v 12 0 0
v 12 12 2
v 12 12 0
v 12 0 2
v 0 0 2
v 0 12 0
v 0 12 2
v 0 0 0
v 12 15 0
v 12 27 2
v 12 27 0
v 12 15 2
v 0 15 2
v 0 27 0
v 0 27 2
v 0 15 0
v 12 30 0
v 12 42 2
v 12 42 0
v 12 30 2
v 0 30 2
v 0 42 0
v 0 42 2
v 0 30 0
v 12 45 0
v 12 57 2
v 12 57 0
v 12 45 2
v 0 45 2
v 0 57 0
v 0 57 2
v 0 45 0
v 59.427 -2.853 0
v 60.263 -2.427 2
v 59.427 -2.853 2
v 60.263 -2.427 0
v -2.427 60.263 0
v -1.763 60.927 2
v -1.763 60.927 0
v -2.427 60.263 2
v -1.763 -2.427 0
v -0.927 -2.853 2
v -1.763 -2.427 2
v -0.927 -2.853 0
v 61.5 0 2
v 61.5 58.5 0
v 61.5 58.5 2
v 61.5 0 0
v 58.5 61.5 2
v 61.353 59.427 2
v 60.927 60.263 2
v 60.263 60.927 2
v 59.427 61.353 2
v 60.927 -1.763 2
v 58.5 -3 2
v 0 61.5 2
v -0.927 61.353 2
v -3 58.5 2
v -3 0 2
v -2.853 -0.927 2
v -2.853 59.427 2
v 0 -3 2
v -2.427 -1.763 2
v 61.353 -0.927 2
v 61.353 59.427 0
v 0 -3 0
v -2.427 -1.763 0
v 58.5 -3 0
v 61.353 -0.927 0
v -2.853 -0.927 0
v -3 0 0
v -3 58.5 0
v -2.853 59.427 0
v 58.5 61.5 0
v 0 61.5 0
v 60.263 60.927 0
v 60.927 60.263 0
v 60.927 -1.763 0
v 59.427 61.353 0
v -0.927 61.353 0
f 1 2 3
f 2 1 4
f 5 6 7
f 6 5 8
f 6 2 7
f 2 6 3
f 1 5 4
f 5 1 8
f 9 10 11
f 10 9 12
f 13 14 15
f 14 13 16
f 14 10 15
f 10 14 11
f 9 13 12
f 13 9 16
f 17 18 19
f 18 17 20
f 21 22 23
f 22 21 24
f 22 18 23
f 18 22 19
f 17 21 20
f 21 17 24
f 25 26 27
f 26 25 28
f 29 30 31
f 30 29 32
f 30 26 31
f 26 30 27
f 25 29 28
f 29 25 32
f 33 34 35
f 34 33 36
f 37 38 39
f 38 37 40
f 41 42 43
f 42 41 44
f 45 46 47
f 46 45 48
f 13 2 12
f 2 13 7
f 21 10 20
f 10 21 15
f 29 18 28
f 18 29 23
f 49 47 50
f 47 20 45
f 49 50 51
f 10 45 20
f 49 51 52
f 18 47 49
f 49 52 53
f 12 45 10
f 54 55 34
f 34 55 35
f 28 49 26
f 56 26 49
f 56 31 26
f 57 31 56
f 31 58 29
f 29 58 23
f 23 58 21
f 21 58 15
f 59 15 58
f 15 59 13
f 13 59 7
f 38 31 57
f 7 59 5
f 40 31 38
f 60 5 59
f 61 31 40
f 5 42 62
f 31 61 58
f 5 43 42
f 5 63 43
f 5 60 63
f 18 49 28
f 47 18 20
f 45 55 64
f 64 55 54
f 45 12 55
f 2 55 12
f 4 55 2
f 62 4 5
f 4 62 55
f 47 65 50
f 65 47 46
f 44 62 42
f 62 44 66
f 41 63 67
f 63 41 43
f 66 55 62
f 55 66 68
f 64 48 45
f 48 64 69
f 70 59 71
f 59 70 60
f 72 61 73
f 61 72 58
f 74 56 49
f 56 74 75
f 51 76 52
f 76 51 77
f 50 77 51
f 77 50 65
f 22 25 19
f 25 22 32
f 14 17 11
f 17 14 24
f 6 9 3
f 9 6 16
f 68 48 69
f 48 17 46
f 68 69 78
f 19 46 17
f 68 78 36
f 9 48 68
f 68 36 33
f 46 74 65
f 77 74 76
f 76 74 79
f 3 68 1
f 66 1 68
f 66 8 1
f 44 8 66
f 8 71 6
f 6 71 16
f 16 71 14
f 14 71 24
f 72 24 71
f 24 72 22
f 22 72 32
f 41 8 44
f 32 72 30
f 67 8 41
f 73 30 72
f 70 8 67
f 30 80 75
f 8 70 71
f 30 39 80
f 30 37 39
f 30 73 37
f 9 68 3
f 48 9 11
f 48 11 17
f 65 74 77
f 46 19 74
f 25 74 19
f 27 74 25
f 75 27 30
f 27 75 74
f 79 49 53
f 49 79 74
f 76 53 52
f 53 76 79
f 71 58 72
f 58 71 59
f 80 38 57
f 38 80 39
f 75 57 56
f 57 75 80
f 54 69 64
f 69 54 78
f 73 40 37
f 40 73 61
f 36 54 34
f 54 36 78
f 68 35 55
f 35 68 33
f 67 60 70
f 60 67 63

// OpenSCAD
// file: ../../../../switch-mounting-holes/keyboard-switch-mounting-holes.scad
/**
 * buttonSide - the length of the side of the rectangular cutout for the button/key
 */
module keyboardSwitchMountingHoles(buttonCount = 4,
			 buttonSide = 5,
		 	 panelHeight = 1)
{
	x = 0;
	startY = 0;

	ySpacing = 3;
	yIncrement = buttonSide + ySpacing;

	for(i = [0 : buttonCount-1])
	{
		y = startY + (i * yIncrement);

		zLength = 2 * panelHeight + 0.2;

		color("green")
		translate([x, y, -0.1])
		cube([buttonSide, buttonSide, zLength]);
	}
}
// file: ../../../../../../basics/rounded-edges/rounded-cube/rounded-cube.scad
/**
 *
 *  some parts of this software were inspired by
 *
 * 	     http://www.thingiverse.com/thing:9347
 *
 */

/**
 * makes a rounded cube
 */
module roundedCube(cornerRadius=4,
				   cubeCentered=false,
				   sides=30,
				   sidesOnly=false,
				   size=[20,20,2])
{
    $fn=sides;

    x = size[0] - cornerRadius/2;
    y = size[1] - cornerRadius/2;
    z = size[2];

    minkowski(size, cornerRadius)
    {
        cube(size=[x,y,z], center=cubeCentered);

        if(sidesOnly)
        {
            cylinder(r=cornerRadius);
        }
        else
        {
            sphere(r=cornerRadius);
        }
    };
}
// file: ../../../../mounting-plates/keyboard-switch-mounting-plate.scad
use <../../../basics/rounded-edges/rounded-cube/rounded-cube.scad>

use <../../../electronics/keyboards/switch-mounting-holes/keyboard-switch-mounting-holes.scad>

module keyboardSwitchMountingPlateBase(boardLengthX,
			boardLengthY,
			cornerRadius,
			panelHeight)
{
	roundedCube(cornerRadius = cornerRadius,
				sides = 20,
				sidesOnly = true,
				size = [boardLengthX, boardLengthY, panelHeight]);
}

module keyboardSwitchMountingPlate(boardLengthX,
                                    boardLengthY,
                                    buttonCount,
                                    buttonSide,
                                    cornerRadius,
                                    panelHeight)
{
	difference()
	{
		keyboardSwitchMountingPlateBase(boardLengthX,
			 boardLengthY,
			 cornerRadius,
		 	 panelHeight);

		keyboardSwitchMountingHoles(buttonCount,
			  buttonSide,
			  panelHeight);
	}
}
// file: ../../../../switch-mounting-holes/adafruit-1009/adafruit-1009-panel.scad
use <../../mounting-plates/keyboard-switch-mounting-plate.scad>

// adafruit tactile buttons:
//
//	https://www.adafruit.com/product/1009
//	https://www.adafruit.com/product/1010
        
module adafruit10009SwitchPanel(boardLengthX)
{
    buttonSide = 12; // 12mm based on the details from the Adafruit site

    keyboardSwitchMountingPlate(boardLengthX = boardLengthX,
                  boardLengthY = 60,
                  buttonCount = 4,
                  buttonSide = buttonSide,
                  cornerRadius = 3,
                  panelHeight = 1);    
}
// main file
use <../../../../switch-mounting-holes/adafruit-1009/adafruit-1009-panel.scad>
        
adafruit10009SwitchPanel(boardLengthX = 60);
